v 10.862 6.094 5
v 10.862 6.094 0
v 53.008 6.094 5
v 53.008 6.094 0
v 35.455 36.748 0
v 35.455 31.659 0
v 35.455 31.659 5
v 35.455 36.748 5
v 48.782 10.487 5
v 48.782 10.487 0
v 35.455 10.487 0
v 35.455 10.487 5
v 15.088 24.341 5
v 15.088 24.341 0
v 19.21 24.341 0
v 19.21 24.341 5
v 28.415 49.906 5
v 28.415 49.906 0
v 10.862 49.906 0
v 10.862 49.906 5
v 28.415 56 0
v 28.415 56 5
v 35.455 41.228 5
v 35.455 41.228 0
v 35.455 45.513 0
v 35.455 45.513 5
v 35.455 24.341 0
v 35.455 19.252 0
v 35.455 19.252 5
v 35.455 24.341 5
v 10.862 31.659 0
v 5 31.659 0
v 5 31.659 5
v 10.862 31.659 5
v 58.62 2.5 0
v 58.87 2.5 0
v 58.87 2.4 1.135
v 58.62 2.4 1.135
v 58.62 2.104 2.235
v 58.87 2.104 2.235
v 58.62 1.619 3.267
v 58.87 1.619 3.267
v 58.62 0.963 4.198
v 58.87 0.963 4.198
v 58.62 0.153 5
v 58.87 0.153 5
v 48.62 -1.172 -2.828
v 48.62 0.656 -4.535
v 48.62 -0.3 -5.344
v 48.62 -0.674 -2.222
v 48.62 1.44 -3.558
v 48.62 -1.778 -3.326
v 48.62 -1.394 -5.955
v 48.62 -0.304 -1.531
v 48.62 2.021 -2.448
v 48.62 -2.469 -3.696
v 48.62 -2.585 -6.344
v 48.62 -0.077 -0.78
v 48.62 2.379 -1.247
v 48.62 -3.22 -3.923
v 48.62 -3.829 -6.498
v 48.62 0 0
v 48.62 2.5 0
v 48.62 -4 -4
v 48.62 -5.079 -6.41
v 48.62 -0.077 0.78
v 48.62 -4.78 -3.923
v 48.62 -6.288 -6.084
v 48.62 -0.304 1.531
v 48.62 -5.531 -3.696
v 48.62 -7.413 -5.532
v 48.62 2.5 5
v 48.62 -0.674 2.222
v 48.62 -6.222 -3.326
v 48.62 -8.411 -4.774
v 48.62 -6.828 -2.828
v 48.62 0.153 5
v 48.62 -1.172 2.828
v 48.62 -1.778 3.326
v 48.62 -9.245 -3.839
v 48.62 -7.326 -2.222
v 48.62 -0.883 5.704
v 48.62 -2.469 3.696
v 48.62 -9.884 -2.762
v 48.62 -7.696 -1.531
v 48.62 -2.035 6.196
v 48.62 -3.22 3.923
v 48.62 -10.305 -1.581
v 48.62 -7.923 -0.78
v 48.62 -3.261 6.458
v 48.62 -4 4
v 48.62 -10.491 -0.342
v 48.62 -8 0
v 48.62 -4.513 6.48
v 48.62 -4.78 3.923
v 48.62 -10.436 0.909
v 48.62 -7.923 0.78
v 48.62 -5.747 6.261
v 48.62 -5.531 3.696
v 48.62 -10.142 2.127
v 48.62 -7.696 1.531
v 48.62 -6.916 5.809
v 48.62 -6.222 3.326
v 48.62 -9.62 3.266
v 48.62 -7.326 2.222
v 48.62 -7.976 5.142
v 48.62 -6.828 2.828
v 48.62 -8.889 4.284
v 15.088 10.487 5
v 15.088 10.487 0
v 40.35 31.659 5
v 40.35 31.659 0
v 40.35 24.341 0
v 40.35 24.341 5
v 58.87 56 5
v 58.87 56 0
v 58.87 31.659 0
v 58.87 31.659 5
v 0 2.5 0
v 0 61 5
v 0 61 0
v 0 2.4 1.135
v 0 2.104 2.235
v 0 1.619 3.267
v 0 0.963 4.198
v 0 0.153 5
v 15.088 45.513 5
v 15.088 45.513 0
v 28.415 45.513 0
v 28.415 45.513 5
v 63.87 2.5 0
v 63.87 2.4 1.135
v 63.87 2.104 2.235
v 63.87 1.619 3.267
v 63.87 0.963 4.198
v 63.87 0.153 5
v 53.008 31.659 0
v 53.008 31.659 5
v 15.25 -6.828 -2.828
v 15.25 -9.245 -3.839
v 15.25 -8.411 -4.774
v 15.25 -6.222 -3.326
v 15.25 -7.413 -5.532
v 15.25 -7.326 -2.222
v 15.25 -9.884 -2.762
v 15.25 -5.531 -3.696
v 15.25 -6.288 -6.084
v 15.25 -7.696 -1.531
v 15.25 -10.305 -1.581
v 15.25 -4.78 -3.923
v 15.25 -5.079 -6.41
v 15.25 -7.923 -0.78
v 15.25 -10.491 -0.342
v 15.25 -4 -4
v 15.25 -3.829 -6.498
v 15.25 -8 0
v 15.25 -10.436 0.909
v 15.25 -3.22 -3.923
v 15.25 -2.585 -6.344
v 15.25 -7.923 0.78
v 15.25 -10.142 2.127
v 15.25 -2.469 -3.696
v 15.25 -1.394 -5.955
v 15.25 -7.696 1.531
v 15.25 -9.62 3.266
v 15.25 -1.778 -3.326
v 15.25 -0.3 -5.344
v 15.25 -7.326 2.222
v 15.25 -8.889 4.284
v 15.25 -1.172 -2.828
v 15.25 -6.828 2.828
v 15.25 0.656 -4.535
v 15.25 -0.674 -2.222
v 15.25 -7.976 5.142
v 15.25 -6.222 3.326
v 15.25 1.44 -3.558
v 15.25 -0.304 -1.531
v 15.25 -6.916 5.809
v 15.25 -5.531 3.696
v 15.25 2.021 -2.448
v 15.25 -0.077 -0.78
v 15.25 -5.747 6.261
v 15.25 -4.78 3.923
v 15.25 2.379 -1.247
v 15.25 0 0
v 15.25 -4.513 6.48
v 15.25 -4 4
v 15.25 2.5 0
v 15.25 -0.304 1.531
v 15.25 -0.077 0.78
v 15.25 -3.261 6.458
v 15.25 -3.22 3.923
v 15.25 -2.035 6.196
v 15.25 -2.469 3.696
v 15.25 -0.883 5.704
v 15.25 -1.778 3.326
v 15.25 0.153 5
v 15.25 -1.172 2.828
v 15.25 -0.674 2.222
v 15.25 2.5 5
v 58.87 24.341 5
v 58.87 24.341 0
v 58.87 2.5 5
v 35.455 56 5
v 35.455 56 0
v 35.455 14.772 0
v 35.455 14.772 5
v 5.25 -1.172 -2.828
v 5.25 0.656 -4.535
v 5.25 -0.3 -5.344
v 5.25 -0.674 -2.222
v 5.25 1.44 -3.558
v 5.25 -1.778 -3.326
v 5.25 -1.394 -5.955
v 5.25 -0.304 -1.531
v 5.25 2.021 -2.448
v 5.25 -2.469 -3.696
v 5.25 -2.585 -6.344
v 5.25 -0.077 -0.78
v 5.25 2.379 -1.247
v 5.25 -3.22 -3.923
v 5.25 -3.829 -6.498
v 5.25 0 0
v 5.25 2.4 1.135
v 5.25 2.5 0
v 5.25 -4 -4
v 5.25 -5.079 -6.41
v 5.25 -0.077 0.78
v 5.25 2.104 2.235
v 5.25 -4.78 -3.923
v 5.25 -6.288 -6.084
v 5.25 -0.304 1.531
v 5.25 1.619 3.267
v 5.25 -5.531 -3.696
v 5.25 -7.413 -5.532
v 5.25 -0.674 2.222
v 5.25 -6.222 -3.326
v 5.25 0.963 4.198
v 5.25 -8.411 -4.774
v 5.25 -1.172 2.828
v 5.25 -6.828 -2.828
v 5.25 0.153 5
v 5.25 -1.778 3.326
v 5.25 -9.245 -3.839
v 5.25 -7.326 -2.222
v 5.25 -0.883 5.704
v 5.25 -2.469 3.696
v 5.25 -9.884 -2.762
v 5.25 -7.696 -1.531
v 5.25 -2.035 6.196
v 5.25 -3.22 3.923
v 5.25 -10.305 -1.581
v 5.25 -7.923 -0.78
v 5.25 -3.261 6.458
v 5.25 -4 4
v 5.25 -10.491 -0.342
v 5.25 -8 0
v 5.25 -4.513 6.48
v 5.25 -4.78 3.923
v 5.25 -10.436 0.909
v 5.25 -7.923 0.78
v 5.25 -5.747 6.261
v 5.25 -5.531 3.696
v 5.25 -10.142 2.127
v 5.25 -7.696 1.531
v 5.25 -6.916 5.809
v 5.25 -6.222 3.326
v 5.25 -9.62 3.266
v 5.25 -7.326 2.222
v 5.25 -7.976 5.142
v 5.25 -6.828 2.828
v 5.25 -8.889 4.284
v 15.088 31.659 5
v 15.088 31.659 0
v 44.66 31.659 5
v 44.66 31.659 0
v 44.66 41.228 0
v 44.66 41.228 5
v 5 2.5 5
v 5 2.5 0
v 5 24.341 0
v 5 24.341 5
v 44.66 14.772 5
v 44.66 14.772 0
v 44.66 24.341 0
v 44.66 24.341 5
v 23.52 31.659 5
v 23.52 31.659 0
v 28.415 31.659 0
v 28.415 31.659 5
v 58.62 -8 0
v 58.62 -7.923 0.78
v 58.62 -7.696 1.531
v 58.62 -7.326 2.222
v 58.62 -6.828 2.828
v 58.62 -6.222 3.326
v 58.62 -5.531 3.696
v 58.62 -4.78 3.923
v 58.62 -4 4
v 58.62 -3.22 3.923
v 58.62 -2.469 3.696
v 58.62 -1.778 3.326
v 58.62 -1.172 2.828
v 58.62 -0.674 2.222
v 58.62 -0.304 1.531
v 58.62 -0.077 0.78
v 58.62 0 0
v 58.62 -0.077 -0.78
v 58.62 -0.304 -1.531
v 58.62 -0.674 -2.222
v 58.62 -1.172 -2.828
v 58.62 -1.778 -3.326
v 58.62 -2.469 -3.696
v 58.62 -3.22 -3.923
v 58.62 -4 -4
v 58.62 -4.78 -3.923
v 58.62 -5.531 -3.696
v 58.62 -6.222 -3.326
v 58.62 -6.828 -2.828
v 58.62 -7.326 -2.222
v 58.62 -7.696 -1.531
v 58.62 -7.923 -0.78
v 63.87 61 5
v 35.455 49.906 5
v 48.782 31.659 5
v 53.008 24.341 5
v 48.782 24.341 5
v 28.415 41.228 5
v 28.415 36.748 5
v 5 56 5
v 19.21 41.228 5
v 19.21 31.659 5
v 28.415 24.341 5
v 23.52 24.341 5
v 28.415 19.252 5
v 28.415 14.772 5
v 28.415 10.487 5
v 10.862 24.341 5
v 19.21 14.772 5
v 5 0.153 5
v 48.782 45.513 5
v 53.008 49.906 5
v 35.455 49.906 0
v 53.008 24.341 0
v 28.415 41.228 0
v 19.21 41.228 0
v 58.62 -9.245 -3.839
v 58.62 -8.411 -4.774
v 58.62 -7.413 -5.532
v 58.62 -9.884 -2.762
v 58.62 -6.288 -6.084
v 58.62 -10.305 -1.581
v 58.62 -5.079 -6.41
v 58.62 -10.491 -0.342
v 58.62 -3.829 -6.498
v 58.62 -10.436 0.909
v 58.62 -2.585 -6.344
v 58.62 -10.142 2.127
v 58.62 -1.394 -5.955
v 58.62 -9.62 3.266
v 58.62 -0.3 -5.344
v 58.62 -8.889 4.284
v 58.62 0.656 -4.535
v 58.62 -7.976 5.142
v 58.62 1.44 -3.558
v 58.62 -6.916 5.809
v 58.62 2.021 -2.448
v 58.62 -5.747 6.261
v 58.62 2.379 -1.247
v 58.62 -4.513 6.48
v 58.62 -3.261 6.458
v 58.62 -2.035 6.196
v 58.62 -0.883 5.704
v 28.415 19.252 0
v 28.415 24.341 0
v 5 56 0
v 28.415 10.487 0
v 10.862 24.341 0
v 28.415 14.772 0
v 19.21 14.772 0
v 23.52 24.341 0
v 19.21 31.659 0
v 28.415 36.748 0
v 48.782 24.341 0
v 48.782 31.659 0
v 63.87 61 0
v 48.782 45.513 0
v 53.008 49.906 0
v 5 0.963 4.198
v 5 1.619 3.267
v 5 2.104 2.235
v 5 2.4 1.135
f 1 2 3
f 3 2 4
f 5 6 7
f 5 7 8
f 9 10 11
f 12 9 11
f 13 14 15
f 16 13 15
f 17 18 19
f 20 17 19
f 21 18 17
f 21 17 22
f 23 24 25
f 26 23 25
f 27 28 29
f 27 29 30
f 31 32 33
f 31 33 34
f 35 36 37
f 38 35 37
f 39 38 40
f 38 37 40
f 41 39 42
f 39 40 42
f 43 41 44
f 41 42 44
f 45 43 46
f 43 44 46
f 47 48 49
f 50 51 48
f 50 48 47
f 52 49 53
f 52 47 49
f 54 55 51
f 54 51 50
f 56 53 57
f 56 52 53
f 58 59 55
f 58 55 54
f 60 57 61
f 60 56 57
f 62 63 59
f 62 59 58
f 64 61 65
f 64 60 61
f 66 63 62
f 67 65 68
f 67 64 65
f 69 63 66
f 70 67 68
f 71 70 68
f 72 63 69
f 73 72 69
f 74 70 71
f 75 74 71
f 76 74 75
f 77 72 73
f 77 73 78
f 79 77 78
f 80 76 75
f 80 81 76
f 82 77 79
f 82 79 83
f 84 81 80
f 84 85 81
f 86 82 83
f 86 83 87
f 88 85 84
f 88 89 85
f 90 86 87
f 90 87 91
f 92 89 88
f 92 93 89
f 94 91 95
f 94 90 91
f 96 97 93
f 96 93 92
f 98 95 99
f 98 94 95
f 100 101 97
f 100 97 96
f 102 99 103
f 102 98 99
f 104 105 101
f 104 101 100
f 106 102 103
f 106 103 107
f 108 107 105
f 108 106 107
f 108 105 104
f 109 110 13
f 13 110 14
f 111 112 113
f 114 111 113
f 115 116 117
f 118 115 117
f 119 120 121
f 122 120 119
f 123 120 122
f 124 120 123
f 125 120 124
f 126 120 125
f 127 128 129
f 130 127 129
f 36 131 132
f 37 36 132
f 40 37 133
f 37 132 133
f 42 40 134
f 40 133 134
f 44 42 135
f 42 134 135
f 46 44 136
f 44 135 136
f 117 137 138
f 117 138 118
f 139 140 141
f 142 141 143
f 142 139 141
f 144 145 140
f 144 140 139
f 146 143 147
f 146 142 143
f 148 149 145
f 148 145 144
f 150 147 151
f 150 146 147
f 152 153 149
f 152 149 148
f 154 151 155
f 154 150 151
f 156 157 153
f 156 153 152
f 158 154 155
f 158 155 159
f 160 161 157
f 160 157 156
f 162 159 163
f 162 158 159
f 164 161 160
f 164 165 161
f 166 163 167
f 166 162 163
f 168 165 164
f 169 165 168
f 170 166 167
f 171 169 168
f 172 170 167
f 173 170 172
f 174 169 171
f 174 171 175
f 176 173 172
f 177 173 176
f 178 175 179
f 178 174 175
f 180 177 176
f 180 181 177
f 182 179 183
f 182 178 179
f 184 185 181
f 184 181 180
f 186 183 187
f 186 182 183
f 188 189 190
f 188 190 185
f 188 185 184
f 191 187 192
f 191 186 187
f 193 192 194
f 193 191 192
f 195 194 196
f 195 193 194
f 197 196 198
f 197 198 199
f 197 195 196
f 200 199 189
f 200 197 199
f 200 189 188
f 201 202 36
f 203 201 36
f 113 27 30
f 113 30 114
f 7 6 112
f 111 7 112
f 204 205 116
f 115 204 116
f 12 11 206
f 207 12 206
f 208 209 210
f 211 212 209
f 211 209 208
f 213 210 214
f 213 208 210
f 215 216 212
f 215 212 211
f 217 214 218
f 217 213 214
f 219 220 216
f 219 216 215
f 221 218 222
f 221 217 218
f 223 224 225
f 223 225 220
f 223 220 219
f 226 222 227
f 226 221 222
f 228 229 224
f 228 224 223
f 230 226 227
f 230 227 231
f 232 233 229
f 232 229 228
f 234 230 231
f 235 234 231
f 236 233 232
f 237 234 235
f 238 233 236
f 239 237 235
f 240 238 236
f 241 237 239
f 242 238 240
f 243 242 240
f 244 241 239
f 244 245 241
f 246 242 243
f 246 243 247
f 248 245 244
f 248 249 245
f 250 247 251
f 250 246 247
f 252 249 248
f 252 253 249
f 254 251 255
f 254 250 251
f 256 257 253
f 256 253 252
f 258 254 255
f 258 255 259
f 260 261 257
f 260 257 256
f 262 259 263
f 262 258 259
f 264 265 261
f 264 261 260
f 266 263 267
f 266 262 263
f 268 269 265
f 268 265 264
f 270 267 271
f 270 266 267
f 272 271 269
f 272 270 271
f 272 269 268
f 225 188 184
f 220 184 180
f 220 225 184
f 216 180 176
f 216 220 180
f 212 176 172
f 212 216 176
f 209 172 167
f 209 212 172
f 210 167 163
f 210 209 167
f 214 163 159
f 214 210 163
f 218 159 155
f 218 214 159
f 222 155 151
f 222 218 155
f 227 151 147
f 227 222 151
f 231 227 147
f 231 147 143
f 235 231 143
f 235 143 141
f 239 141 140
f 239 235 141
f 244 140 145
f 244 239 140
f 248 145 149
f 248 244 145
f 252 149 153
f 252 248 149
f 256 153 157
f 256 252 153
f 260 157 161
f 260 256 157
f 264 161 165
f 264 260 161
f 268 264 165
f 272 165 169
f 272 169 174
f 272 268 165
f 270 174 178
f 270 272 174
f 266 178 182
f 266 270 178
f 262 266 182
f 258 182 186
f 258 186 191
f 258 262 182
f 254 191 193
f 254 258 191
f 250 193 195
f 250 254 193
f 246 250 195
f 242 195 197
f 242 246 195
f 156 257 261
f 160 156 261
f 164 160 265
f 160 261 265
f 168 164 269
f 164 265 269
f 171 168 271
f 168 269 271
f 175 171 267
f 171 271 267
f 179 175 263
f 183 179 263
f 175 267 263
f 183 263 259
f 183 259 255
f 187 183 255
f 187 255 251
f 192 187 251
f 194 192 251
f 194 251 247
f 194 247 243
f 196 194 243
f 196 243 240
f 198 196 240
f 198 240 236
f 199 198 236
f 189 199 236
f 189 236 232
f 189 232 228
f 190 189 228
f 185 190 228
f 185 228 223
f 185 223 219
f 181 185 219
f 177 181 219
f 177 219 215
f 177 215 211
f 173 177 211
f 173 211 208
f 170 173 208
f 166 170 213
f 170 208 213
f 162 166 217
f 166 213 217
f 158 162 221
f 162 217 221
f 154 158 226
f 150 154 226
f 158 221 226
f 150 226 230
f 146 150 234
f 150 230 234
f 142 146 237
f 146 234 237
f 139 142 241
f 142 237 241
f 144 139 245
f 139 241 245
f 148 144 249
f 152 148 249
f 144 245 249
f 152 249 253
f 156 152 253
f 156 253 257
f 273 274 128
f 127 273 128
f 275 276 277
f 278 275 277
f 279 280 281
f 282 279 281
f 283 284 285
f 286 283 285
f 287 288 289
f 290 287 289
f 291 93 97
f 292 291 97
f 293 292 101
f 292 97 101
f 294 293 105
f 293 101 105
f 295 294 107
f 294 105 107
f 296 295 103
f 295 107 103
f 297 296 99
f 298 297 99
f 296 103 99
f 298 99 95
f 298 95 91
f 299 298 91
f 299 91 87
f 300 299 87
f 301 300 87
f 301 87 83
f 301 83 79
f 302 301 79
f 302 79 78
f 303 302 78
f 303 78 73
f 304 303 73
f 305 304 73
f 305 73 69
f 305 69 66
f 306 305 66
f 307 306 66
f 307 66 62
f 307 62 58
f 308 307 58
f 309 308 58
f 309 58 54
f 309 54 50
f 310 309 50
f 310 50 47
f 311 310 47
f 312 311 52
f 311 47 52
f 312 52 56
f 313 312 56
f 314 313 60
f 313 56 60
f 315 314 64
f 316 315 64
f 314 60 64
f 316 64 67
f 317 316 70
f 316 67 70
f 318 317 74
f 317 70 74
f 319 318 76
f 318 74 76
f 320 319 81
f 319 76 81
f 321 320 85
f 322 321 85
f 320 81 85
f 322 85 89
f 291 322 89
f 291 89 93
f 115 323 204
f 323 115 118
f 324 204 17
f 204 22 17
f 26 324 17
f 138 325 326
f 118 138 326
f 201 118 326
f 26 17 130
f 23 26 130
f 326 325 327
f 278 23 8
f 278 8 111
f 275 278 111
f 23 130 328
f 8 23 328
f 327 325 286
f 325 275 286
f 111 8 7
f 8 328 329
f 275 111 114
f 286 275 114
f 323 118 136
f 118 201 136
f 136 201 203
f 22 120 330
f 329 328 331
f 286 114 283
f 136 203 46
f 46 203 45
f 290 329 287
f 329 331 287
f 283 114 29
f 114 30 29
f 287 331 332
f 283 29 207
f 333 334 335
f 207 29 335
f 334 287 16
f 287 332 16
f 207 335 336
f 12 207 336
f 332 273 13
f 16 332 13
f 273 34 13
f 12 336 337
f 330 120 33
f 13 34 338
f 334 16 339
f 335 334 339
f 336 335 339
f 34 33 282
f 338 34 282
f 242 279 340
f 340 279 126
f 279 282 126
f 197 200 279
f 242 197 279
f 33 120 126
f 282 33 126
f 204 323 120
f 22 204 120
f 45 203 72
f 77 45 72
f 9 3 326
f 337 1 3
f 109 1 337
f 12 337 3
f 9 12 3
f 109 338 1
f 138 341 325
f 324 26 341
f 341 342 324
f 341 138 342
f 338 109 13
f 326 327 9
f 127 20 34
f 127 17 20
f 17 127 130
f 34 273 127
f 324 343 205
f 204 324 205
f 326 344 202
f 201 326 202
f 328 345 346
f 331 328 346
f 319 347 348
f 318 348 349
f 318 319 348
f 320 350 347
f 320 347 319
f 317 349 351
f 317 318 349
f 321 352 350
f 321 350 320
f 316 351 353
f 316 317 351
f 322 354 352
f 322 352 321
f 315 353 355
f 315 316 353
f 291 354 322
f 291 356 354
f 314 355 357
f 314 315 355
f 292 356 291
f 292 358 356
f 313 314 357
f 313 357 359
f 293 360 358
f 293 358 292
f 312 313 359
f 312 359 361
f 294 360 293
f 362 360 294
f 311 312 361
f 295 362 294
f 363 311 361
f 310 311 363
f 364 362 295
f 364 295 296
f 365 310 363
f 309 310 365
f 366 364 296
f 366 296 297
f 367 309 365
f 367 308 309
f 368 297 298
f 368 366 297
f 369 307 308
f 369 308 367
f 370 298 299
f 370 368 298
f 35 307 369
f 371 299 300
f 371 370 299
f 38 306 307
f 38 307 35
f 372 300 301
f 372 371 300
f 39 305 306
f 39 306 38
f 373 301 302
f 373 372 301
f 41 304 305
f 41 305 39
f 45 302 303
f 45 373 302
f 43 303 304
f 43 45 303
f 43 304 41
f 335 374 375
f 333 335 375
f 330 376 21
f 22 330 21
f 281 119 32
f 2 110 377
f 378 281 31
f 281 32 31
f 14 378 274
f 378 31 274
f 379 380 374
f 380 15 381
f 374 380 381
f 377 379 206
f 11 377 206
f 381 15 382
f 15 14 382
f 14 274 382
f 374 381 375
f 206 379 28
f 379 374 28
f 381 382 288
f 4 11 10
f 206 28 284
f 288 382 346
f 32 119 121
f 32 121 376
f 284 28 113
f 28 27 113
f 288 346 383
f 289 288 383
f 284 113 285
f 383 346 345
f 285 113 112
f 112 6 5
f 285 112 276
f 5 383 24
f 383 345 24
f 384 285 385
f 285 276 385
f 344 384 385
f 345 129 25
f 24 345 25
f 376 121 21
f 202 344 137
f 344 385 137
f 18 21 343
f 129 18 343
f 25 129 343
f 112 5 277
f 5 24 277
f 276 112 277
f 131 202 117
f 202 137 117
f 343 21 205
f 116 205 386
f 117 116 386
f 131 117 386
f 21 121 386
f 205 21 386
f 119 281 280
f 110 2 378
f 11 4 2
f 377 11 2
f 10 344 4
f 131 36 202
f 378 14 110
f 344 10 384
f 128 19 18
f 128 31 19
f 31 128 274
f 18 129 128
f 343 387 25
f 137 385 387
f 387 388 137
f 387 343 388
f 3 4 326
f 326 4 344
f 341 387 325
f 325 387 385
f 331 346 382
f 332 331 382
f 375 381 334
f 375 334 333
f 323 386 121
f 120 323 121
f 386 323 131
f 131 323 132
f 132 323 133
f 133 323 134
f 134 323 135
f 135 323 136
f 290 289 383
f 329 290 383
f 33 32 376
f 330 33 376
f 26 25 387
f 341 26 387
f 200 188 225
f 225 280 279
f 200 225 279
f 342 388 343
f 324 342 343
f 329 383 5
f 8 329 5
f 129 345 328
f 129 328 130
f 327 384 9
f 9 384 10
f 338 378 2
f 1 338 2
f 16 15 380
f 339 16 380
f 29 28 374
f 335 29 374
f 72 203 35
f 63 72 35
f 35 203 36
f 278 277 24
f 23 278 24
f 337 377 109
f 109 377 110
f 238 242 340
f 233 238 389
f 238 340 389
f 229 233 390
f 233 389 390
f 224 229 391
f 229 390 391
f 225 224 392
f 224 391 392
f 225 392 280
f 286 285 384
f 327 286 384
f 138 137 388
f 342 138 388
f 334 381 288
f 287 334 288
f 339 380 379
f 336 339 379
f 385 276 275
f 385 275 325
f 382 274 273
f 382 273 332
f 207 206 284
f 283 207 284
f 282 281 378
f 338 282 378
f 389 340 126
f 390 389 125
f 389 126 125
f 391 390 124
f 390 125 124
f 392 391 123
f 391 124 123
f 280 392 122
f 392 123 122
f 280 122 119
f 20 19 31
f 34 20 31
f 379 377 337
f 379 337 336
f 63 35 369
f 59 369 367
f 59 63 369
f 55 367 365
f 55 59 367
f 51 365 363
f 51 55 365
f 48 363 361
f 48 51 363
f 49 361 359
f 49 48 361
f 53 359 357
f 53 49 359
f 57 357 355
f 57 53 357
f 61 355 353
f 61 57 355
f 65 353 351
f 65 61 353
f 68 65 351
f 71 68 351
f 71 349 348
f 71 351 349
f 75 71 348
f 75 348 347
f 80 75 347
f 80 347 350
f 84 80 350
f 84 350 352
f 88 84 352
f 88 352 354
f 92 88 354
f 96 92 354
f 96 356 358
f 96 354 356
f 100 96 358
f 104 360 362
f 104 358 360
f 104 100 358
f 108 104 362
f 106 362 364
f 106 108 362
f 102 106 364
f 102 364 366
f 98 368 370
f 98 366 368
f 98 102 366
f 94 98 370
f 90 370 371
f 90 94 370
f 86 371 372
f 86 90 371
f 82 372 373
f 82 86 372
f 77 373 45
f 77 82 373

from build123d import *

# Parameters (mm, degrees)
F0_W      = 7.0402130931
F0_H      = 6.0935864692
F0_H_2    = 4.393223295
F0_W_2    = 4.2261239089
F0_H_3    = 7.3185805312
F0_W_3    = 4.3096756666
F0_H_4    = 4.4800786584
F0_H_5    = 4.2855439132
F0_W_4    = 5.8618125553
F0_W_5    = 4.1225401893
F0_W_6    = 4.8947411333
F0_H_6    = 5.0882773987
F1_DEPTH  = 5
F2_R      = 6.5
F2_R_2    = 4
F3_DEPTH  = 63.87
F4_R      = 6.5
F4_R_2    = 4
F5_DEPTH  = 5.25
F6_R      = 6.5
F6_R_2    = 4
F7_DEPTH  = 5.25
F9_R      = 6.5
F9_R_2    = 4
F10_DEPTH = 33.37
F12_DEPTH = 10.25
F14_DEPTH = 10.25


with BuildPart() as f1:
    # F0 (on Top) → F1 (new body)
    with BuildSketch(Plane.XY):
        Polygon((0, 61), (0, 0), (5, 0), (5, 24.3407097344), (5, 31.6592902656), (5, 56), (28.4148934534, 56), (35.4551065466, 56), (58.87, 56), (58.87, 31.6592902656), (58.87, 24.3407097344), (58.87, 0), (63.87, 0), (63.87, 61), align=None)
        Polygon((10.8618125553, 49.9064135308), (10.8618125553, 31.6592902656), (15.0879364642, 31.6592902656), (15.0879364642, 45.5131902358), (28.4148934534, 45.5131902358), (28.4148934534, 49.9064135308), align=None)
        with Locations((31.935, 52.9532067654)):
            Rectangle(F0_W, F0_H)
        Polygon((48.7820635358, 31.6592902656), (53.0081874447, 31.6592902656), (53.0081874447, 49.9064135308), (35.4551065466, 49.9064135308), (35.4551065466, 45.5131902358), (48.7820635358, 45.5131902358), align=None)
        with Locations((31.935, 47.7098018833)):
            Rectangle(F0_W, F0_H_2)
        with Locations((12.9748745097, 28)):
            Rectangle(F0_W_2, F0_H_3)
        Polygon((10.8618125553, 6.0935864692), (28.4148934534, 6.0935864692), (28.4148934534, 10.4868097642), (15.0879364642, 10.4868097642), (15.0879364642, 24.3407097344), (10.8618125553, 24.3407097344), align=None)
        with Locations((31.935, 8.2901981167)):
            Rectangle(F0_W, F0_H_2)
        Polygon((35.4551065466, 10.4868097642), (35.4551065466, 6.0935864692), (53.0081874447, 6.0935864692), (53.0081874447, 24.3407097344), (48.7820635358, 24.3407097344), (48.7820635358, 10.4868097642), align=None)
        with Locations((50.8951254903, 28)):
            Rectangle(F0_W_2, F0_H_3)
        Polygon((40.3498476799, 31.6592902656), (44.6595233465, 31.6592902656), (44.6595233465, 41.2276463227), (35.4551065466, 41.2276463227), (35.4551065466, 36.7475676643), (40.3498476799, 36.7475676643), align=None)
        with Locations((42.5046855132, 28)):
            Rectangle(F0_W_3, F0_H_3)
        Polygon((35.4551065466, 19.2524323357), (35.4551065466, 14.7723536773), (44.6595233465, 14.7723536773), (44.6595233465, 24.3407097344), (40.3498476799, 24.3407097344), (40.3498476799, 19.2524323357), align=None)
        Polygon((19.2104766535, 14.7723536773), (28.4148934534, 14.7723536773), (28.4148934534, 19.2524323357), (23.5201523201, 19.2524323357), (23.5201523201, 24.3407097344), (19.2104766535, 24.3407097344), align=None)
        with Locations((31.935, 17.0123930065)):
            Rectangle(F0_W, F0_H_4)
        with Locations((31.935, 12.6295817207)):
            Rectangle(F0_W, F0_H_5)
        with Locations((21.3653144868, 28)):
            Rectangle(F0_W_3, F0_H_3)
        Polygon((19.2104766535, 41.2276463227), (19.2104766535, 31.6592902656), (23.5201523201, 31.6592902656), (23.5201523201, 36.7475676643), (28.4148934534, 36.7475676643), (28.4148934534, 41.2276463227), align=None)
        with Locations((31.935, 38.9876069935)):
            Rectangle(F0_W, F0_H_4)
        with Locations((55.9390937224, 28)):
            Rectangle(F0_W_4, F0_H_3)
        with Locations((46.7207934411, 28)):
            Rectangle(F0_W_5, F0_H_3)
        with Locations((17.1492065589, 28)):
            Rectangle(F0_W_5, F0_H_3)
        with Locations((7.9309062776, 28)):
            Rectangle(F0_W_4, F0_H_3)
        with Locations((31.935, 43.3704182793)):
            Rectangle(F0_W, F0_H_5)
        with Locations((25.9675228868, 34.2034289649)):
            Rectangle(F0_W_6, F0_H_6)
        with Locations((37.9024771132, 34.2034289649)):
            Rectangle(F0_W_6, F0_H_6)
        with Locations((37.9024771132, 21.7965710351)):
            Rectangle(F0_W_6, F0_H_6)
        with Locations((25.9675228868, 21.7965710351)):
            Rectangle(F0_W_6, F0_H_6)
    extrude(amount=F1_DEPTH)

    # F2 (on face) → F3 (join, through all)
    with BuildSketch(Plane(origin=(0, 0, 0), x_dir=(0, -1, 0), z_dir=(-1, 0, 0))):
        with Locations((4, 0)):
            Circle(F2_R)
        with Locations((4, 0)):
            Circle(F2_R_2, mode=Mode.SUBTRACT)
    extrude(amount=-F3_DEPTH)

    # F4 (on face) → F5 (cut)
    with BuildSketch(Plane.YZ.offset(63.87)):
        with Locations((-4, 0)):
            Circle(F4_R)
        with Locations((-4, 0)):
            Circle(F4_R_2, mode=Mode.SUBTRACT)
    extrude(amount=-F5_DEPTH, mode=Mode.SUBTRACT)

    # F6 (on face) → F7 (cut)
    with BuildSketch(Plane(origin=(0, 0, 0), x_dir=(0, -1, 0), z_dir=(-1, 0, 0))):
        with Locations((4, 0)):
            Circle(F6_R)
        with Locations((4, 0)):
            Circle(F6_R_2, mode=Mode.SUBTRACT)
    extrude(amount=-F7_DEPTH, mode=Mode.SUBTRACT)

    # F9 (on offset) → F10 (cut)
    with BuildSketch(Plane(origin=(15.25, 0, 0), x_dir=(0, -1, 0), z_dir=(-1, 0, 0))):
        with Locations((4, 0)):
            Circle(F9_R)
        with Locations((4, 0)):
            Circle(F9_R_2, mode=Mode.SUBTRACT)
    extrude(amount=-F10_DEPTH, mode=Mode.SUBTRACT)

    # F11 (on face) → F12 (join)
    with BuildSketch(Plane(origin=(58.87, 0, 0), x_dir=(0, -1, 0), z_dir=(-1, 0, 0))):
        with BuildLine():
            ThreePointArc((-2.5, 0), (-1.884153616, 2.7616546168), (-0.1533119315, 5))
            Line((-0.1533119315, 5), (-2.5, 5))
            Line((-2.5, 5), (-2.5, 0))
        make_face()
    extrude(amount=F12_DEPTH)

    # F13 (on face) → F14 (join)
    with BuildSketch(Plane.YZ.offset(5)):
        with BuildLine():
            ThreePointArc((0.1533119315, 5), (1.884153616, 2.7616546168), (2.5, 0))
            Line((2.5, 0), (2.5, 5))
            Line((2.5, 5), (0.1533119315, 5))
        make_face()
    extrude(amount=F14_DEPTH)


solid = f1.part
